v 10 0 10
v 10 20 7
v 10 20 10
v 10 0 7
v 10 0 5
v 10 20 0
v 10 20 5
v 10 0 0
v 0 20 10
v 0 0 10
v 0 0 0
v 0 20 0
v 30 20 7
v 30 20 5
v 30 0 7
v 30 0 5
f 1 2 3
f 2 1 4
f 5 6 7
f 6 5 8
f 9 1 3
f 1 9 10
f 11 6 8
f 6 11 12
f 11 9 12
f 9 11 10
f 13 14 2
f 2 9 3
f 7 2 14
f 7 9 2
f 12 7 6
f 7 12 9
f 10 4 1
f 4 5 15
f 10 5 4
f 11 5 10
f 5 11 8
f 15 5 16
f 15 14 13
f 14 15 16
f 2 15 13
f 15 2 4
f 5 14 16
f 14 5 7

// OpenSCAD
// Flat shelf carried on ONE side only: not a bridge, still an unsupported overhang.
union() { cube([10, 20, 10]); translate([10, 0, 5]) cube([20, 20, 2]); }
